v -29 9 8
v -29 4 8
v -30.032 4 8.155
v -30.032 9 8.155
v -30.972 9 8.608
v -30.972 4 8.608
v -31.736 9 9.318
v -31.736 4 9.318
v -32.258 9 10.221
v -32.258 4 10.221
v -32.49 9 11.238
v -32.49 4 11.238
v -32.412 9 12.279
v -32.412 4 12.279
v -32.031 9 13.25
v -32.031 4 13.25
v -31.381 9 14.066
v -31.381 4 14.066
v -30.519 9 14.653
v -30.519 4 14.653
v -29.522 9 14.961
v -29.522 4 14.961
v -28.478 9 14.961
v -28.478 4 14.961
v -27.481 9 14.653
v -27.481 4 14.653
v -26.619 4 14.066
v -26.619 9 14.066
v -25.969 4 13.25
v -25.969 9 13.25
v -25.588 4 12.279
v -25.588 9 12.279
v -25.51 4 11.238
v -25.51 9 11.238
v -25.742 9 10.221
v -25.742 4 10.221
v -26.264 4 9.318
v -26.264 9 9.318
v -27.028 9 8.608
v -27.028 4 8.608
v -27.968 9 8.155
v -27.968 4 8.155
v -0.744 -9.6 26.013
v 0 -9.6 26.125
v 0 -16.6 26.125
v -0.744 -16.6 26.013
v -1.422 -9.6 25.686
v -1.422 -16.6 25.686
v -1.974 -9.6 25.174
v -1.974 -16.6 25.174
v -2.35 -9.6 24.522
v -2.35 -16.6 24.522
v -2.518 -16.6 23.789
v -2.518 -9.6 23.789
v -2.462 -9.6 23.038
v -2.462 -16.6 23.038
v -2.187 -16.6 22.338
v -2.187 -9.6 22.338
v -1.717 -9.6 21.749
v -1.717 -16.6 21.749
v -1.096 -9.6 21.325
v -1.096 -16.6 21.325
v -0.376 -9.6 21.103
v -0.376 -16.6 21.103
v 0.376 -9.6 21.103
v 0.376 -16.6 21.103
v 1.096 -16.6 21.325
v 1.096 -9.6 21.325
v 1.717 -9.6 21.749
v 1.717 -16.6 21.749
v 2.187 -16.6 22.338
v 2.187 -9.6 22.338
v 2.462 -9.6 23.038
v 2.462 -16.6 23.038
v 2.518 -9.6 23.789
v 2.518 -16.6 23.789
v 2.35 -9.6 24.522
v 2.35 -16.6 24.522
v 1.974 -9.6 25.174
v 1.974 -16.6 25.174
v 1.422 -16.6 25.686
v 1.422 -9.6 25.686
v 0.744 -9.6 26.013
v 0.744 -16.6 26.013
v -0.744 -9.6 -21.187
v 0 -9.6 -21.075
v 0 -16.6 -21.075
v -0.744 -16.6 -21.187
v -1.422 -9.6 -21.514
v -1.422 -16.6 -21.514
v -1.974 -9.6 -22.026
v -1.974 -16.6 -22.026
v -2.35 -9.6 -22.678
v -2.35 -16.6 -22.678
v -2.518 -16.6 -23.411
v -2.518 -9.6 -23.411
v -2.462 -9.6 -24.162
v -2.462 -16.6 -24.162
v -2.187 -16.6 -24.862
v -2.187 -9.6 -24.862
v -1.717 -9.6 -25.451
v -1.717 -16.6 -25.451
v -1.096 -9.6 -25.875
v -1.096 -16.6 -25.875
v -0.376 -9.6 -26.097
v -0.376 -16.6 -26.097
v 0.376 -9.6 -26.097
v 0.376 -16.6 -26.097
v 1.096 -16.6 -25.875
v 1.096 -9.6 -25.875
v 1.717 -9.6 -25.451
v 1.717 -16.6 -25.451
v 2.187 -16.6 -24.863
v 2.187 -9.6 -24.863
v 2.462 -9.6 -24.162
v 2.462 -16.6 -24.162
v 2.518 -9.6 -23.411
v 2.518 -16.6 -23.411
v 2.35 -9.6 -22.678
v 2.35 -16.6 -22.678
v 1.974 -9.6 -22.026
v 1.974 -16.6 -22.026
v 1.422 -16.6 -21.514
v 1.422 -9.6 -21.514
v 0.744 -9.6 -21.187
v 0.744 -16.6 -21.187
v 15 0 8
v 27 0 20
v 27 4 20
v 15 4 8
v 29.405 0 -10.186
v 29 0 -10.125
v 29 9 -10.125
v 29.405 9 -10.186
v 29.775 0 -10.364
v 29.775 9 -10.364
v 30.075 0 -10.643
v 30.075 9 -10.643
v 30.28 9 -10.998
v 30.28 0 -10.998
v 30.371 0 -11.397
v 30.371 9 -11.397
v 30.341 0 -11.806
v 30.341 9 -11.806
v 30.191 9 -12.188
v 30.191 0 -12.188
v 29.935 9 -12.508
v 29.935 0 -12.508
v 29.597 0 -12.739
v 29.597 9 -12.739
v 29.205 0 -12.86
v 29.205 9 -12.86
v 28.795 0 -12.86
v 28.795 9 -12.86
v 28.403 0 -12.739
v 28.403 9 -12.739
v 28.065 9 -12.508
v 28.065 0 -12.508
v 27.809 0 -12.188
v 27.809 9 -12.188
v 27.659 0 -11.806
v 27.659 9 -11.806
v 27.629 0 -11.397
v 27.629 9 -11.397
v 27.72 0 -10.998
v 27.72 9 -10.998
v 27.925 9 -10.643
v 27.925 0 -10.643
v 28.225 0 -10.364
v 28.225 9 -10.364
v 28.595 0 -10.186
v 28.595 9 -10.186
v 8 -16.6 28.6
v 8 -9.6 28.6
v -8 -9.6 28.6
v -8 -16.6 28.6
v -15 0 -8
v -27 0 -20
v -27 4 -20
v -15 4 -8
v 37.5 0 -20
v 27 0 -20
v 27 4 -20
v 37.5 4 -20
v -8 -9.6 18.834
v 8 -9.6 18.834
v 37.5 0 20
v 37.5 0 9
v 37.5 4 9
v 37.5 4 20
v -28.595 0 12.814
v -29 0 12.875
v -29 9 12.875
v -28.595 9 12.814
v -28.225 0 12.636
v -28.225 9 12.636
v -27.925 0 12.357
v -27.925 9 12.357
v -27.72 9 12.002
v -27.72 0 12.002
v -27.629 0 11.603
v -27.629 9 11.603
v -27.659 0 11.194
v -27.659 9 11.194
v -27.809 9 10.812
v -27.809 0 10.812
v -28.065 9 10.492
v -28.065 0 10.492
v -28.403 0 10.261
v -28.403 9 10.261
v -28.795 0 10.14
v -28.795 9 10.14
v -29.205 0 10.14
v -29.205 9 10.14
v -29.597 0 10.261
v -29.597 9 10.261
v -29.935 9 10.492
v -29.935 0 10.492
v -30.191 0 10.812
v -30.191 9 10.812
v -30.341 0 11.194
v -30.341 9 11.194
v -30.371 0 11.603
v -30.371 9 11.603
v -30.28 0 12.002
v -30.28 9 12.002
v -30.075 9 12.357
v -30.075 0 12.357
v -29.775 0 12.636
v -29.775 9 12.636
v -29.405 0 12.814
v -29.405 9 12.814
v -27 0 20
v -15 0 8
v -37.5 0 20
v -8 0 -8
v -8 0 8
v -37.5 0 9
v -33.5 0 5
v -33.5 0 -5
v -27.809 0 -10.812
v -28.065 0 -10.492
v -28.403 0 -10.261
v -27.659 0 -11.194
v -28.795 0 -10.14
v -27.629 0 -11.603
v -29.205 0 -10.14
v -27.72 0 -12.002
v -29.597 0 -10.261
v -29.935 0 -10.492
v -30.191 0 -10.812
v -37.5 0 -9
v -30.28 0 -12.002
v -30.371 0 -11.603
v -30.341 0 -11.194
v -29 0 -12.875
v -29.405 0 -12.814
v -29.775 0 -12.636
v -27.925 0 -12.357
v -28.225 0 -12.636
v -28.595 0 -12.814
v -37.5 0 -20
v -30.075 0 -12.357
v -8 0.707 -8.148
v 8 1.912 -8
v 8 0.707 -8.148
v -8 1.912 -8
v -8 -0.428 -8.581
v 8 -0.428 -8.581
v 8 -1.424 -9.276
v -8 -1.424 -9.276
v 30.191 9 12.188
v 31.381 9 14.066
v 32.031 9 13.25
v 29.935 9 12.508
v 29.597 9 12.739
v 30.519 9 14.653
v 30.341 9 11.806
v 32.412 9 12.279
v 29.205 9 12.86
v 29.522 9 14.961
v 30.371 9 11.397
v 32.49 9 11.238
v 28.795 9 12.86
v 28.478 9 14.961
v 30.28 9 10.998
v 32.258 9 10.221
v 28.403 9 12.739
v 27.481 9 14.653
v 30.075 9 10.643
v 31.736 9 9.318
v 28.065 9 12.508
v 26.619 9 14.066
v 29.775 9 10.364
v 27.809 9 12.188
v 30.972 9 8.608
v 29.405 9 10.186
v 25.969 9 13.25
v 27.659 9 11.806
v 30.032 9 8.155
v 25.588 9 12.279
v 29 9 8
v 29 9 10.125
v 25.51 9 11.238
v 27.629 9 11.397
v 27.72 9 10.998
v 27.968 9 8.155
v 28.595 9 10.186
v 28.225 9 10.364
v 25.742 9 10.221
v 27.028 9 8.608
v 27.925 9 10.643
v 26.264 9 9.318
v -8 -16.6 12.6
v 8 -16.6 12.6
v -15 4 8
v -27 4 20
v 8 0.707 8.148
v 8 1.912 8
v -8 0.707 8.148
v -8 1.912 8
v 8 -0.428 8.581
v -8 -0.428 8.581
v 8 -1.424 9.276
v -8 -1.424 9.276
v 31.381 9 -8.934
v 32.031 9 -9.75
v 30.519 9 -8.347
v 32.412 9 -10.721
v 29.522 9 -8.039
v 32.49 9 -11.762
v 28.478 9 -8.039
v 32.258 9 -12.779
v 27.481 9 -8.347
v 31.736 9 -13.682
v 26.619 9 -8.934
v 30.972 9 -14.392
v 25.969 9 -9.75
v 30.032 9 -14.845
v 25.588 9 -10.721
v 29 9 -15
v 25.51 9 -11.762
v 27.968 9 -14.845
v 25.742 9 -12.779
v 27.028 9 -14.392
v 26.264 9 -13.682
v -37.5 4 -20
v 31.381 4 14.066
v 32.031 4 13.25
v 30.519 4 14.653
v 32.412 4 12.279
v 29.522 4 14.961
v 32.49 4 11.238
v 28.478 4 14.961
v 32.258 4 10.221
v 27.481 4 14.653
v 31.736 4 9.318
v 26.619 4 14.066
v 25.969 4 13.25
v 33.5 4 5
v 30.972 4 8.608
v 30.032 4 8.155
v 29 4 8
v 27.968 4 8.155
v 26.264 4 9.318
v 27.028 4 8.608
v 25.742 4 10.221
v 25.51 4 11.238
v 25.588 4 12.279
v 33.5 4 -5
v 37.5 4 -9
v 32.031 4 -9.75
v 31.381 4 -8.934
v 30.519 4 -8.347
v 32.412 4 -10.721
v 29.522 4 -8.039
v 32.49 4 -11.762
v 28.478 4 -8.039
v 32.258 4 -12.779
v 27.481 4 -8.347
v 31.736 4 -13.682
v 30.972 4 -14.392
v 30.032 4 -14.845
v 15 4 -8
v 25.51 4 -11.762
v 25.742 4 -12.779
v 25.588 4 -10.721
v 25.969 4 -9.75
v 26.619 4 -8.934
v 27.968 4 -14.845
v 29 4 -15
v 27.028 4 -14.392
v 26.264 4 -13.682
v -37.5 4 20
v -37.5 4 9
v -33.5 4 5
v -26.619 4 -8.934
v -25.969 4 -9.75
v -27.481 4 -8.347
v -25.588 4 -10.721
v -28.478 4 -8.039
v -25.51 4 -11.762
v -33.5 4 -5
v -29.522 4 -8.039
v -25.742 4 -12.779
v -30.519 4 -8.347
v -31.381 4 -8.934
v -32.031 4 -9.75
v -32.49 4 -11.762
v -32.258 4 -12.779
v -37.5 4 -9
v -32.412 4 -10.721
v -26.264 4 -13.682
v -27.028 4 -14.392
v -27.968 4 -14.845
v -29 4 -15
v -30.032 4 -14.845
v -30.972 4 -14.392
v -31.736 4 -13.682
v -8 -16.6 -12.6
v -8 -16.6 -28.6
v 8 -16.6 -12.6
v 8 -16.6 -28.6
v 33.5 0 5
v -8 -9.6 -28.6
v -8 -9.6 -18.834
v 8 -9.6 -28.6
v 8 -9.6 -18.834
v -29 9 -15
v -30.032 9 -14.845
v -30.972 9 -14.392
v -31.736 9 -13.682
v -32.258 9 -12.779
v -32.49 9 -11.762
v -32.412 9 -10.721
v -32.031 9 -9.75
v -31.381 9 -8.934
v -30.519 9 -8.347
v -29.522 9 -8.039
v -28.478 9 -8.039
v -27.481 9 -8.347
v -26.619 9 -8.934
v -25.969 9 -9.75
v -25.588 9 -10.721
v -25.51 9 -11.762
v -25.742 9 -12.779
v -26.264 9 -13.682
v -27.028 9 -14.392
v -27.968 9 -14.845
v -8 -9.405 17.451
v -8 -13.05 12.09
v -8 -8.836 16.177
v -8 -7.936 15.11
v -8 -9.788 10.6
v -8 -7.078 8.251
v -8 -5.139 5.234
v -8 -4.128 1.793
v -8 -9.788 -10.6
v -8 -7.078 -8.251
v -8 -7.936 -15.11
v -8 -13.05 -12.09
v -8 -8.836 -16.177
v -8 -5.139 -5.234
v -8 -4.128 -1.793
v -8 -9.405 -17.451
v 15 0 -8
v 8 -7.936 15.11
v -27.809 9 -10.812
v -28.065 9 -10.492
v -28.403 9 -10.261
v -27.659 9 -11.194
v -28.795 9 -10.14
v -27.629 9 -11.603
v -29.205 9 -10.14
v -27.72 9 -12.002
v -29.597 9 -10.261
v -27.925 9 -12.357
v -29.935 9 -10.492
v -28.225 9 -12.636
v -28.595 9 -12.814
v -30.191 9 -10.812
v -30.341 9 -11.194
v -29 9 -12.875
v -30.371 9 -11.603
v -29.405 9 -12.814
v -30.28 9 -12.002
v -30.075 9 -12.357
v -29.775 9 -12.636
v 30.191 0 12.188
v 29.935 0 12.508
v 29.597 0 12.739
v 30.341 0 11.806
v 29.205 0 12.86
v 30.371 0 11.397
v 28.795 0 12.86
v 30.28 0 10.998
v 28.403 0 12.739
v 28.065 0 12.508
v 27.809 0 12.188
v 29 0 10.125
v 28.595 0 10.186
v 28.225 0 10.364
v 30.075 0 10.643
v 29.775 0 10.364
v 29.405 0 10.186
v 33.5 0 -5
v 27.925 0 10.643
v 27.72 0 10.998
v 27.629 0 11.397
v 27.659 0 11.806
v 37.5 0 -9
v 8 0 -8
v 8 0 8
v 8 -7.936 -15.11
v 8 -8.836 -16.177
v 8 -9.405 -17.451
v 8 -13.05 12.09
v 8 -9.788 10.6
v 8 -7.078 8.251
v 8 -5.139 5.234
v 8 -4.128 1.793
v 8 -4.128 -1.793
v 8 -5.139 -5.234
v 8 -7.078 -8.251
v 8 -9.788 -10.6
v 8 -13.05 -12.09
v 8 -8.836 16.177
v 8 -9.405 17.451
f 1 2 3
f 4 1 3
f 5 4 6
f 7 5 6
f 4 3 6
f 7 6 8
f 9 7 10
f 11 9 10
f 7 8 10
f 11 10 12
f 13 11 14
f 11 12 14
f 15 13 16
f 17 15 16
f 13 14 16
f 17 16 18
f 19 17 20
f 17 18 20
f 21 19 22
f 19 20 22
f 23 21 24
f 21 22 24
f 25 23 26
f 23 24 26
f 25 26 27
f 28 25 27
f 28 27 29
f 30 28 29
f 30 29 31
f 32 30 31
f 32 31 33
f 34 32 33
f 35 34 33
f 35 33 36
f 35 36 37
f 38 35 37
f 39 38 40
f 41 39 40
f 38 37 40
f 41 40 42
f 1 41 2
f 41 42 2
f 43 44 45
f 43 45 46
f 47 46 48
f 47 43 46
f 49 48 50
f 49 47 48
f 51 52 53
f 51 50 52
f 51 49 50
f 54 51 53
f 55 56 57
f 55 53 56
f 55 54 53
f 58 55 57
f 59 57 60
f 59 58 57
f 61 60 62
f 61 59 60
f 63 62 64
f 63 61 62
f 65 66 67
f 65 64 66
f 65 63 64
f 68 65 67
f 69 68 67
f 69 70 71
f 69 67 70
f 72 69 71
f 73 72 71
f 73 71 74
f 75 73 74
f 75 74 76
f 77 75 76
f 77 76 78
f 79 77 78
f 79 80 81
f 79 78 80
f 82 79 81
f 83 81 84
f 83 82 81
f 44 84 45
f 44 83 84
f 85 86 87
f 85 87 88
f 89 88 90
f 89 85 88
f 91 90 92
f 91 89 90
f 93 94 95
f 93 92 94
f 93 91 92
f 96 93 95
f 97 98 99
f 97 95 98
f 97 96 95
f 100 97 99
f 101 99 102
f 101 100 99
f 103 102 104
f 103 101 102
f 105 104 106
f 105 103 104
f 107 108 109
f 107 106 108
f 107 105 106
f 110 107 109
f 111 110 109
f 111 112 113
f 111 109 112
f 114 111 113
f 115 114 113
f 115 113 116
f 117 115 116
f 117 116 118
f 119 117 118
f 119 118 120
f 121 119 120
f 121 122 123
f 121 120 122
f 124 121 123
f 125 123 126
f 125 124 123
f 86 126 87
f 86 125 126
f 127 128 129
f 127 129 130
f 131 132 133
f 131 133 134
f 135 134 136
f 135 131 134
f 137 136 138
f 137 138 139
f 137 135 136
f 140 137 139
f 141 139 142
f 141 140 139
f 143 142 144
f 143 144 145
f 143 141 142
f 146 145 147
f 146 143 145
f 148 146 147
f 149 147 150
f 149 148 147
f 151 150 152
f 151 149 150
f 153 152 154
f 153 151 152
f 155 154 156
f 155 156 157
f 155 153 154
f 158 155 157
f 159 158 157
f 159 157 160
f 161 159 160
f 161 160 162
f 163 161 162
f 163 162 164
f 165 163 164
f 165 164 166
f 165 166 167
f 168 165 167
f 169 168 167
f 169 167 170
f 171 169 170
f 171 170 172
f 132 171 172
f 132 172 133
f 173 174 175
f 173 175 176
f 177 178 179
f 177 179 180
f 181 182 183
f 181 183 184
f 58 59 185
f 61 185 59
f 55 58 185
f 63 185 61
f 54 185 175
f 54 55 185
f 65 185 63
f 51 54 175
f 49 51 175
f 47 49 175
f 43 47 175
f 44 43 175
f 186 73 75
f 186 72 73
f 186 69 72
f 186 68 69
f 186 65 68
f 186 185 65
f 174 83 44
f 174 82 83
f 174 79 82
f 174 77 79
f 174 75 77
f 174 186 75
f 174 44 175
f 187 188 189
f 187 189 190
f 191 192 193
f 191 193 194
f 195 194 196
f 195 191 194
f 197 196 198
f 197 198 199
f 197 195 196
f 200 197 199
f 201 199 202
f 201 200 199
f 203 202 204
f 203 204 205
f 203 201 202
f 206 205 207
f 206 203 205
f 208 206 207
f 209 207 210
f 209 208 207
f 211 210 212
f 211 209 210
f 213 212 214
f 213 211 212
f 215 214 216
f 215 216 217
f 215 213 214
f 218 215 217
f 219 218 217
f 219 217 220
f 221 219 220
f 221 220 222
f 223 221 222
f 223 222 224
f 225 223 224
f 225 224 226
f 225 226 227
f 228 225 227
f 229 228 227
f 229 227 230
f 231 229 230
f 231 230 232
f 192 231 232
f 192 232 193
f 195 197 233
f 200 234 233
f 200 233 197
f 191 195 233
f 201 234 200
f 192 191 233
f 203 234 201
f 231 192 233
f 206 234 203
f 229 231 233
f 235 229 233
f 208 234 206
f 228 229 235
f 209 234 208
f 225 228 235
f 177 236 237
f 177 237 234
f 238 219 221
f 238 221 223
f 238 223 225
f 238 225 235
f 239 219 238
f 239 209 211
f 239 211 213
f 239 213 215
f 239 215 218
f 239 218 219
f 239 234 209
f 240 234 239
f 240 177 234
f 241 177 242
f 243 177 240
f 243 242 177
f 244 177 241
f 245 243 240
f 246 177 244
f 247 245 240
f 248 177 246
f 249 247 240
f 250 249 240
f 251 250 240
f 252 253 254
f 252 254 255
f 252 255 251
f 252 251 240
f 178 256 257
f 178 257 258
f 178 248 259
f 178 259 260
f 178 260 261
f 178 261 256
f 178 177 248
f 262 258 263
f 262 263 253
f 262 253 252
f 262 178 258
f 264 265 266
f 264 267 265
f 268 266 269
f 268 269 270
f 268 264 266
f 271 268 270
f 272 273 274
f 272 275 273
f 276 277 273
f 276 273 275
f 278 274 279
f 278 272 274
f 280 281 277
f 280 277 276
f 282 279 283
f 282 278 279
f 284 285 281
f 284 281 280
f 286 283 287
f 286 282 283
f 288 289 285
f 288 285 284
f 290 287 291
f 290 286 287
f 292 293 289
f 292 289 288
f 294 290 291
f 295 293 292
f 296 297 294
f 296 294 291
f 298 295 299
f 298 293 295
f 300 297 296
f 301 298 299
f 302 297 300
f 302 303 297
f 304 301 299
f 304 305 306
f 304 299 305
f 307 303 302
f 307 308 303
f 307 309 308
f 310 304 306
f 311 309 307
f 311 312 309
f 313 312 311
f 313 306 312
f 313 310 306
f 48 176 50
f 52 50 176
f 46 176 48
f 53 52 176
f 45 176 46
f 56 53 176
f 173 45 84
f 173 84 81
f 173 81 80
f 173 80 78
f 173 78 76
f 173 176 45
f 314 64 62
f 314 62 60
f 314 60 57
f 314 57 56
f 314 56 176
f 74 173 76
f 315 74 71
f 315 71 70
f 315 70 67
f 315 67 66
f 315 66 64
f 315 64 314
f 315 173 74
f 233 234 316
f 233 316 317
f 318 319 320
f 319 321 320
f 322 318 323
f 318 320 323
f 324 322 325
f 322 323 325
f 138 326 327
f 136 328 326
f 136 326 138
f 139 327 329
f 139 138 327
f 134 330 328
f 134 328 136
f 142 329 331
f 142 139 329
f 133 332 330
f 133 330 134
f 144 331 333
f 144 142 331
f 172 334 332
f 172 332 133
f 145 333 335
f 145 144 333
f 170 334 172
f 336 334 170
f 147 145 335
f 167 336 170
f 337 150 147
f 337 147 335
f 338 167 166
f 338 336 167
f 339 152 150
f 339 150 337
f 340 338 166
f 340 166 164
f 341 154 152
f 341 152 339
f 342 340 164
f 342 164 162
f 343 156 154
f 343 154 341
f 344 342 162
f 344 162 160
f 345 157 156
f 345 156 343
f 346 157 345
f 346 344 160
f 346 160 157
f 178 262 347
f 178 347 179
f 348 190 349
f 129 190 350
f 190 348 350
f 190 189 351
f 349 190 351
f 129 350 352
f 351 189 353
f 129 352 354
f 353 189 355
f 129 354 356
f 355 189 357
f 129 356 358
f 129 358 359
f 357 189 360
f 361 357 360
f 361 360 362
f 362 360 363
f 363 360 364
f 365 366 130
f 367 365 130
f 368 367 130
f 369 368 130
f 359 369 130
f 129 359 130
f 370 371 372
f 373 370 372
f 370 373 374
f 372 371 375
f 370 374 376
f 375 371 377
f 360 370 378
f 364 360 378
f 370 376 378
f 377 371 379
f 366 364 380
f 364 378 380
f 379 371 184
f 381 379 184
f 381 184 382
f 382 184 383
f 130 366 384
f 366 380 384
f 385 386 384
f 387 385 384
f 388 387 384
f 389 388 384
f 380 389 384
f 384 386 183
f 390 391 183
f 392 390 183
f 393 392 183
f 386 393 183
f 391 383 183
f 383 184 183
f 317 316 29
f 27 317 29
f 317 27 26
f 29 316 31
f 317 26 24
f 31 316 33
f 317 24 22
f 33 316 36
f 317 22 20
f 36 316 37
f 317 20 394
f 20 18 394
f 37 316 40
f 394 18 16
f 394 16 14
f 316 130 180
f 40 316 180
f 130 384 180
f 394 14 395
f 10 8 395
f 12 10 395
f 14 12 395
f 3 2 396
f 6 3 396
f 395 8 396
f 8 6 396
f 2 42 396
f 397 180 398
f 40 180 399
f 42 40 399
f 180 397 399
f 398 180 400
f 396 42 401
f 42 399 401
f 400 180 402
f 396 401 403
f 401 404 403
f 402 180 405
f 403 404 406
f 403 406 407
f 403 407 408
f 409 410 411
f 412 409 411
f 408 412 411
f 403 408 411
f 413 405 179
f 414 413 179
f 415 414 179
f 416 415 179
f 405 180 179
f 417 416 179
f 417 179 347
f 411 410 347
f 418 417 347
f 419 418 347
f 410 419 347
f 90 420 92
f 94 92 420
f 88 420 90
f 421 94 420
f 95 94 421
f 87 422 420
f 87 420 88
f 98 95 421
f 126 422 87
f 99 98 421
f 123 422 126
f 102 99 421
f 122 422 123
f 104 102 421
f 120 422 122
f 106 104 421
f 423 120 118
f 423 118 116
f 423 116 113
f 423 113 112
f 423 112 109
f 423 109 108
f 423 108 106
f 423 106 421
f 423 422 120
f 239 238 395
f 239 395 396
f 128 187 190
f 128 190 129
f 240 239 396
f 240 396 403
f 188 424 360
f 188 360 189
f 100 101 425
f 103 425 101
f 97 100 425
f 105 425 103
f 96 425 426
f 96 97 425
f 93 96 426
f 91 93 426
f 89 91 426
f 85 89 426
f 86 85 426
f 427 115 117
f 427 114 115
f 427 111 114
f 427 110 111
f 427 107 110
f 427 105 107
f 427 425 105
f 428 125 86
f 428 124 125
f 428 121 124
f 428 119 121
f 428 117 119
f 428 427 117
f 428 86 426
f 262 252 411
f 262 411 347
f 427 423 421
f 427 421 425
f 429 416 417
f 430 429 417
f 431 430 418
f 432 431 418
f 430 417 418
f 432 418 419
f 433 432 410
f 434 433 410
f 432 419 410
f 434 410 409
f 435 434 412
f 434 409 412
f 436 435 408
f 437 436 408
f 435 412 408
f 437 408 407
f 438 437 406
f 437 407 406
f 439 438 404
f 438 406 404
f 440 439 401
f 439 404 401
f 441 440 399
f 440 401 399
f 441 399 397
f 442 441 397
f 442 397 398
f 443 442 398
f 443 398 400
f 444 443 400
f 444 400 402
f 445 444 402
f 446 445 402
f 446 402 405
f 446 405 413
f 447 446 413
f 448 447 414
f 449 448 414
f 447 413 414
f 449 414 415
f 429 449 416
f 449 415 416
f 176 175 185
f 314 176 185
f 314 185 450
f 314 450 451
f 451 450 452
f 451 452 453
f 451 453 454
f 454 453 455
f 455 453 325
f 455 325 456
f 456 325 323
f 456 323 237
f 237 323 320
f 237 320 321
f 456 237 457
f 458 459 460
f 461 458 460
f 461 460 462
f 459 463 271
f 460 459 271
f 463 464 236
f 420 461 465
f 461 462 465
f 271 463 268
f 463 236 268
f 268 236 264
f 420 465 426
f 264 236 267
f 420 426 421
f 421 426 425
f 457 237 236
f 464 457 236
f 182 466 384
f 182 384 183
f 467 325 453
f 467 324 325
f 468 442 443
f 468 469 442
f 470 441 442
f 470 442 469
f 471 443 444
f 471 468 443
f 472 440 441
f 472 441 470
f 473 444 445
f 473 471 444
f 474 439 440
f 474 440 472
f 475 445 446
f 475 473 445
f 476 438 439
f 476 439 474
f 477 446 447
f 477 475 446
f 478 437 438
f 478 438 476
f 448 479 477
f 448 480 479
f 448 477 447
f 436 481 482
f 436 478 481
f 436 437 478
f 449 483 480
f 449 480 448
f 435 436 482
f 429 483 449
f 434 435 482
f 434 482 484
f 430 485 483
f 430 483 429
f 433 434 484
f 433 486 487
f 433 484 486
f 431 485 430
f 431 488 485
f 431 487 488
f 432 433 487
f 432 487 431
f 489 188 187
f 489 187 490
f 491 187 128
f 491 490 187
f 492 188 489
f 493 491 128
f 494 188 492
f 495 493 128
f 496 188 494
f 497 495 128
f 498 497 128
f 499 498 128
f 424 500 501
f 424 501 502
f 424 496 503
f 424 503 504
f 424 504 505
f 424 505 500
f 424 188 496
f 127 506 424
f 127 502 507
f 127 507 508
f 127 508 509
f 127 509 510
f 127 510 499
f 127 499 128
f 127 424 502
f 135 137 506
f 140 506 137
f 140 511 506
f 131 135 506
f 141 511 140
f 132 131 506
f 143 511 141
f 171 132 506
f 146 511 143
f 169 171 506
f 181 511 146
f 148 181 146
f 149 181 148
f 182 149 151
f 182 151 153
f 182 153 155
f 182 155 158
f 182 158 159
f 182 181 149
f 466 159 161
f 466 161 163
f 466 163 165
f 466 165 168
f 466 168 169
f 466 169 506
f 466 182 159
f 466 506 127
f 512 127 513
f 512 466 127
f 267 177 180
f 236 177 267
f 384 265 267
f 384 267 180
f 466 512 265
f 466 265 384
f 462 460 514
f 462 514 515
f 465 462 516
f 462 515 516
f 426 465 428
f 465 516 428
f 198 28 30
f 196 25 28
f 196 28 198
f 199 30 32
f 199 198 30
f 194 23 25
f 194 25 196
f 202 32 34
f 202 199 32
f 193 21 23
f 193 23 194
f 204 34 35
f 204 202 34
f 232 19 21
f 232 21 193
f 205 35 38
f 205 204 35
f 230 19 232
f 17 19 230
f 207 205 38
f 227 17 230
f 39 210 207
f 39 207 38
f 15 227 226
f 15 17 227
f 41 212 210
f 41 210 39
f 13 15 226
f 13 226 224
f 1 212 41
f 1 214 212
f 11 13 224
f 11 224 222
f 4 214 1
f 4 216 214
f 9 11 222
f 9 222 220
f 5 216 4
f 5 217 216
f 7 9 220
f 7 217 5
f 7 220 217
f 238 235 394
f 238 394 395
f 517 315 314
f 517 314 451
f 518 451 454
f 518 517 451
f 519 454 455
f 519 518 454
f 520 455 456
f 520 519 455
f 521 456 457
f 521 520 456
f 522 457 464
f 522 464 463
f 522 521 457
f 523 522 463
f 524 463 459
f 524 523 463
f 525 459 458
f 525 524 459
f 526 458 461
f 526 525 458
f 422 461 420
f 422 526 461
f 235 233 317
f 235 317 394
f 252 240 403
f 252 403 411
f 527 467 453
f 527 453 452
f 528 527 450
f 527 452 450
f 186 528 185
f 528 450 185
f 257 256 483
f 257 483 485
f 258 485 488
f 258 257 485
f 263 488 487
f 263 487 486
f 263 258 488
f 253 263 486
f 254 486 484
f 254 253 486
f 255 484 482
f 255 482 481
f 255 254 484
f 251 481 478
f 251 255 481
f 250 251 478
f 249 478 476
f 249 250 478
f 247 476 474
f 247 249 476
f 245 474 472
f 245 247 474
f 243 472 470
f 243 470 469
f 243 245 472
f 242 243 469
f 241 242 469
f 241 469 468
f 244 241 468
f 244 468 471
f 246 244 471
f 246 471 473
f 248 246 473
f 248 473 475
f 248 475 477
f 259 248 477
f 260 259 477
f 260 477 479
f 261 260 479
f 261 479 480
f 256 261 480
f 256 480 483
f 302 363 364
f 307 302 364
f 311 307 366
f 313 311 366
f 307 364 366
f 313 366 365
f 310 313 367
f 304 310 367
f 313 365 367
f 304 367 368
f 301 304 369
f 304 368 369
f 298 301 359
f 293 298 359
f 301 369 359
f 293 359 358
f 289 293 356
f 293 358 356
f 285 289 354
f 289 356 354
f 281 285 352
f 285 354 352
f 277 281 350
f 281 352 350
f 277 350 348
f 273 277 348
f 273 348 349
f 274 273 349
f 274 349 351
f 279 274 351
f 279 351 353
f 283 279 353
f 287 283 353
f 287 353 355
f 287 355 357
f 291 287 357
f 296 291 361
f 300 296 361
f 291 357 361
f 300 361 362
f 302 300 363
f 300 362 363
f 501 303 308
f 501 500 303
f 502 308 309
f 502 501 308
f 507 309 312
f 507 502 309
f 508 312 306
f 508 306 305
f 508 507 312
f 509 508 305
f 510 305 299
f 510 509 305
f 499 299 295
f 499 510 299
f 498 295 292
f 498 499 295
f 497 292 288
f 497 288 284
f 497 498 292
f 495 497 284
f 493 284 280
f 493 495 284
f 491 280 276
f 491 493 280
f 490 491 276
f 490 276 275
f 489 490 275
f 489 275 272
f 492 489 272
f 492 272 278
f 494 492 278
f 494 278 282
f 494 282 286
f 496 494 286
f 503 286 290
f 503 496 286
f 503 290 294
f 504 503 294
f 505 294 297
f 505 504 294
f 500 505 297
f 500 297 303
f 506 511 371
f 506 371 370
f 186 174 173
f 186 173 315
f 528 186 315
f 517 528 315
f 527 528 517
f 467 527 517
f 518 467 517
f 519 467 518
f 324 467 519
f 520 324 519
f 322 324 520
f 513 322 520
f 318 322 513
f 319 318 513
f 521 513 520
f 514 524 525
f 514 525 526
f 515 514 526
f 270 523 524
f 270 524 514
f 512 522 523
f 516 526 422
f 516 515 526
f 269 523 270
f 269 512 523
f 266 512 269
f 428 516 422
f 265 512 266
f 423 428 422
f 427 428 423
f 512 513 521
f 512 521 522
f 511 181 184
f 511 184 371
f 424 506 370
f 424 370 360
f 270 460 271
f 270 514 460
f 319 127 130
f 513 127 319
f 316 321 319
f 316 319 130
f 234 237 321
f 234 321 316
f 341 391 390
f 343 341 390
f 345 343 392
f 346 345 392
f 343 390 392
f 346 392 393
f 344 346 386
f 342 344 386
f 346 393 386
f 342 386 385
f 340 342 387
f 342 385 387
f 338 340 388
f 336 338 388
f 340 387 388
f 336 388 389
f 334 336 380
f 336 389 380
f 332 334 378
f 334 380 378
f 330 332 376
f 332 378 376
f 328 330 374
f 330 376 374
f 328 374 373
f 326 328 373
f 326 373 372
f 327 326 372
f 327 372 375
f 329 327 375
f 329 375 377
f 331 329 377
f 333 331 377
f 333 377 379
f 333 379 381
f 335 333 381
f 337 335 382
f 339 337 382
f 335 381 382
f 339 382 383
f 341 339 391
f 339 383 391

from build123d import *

# Parameters (mm, degrees)
SKETCH1_R                  = 1.375
MOUNT_PLATE_DEPTH          = 4
FEUSELAGE_MOUNT_DEPTH      = 8
SKETCH8_R                  = 3.5
SKETCH8_R_2                = 1.375
MOUNTING_HOLES_DEPTH       = 5
FASTENING_HOLES_DEPTH      = 54.661625022
FASTENING_HOLES_DEPTH_BACK = 8
SKETCH10_R                 = 2.525
FILLET1_R                  = 5


with BuildPart() as part:
    # Sketch1 → Mount_Plate (new body)
    with BuildSketch(Plane(origin=(0, 0, 0), x_dir=(1, 0, 0), z_dir=(0, 1, 0))):
        Polygon((37.5, 20), (37.5, 9), (33.5, 5), (33.5, -5), (37.5, -9), (37.5, -20), (27, -20), (15, -8), (-15, -8), (-27, -20), (-37.5, -20), (-37.5, -9), (-33.5, -5), (-33.5, 5), (-37.5, 9), (-37.5, 20), (-27, 20), (-15, 8), (15, 8), (27, 20), align=None)
        with Locations(Location((-29, -11.5, 0), (0, 0, 270))):
            Circle(SKETCH1_R, mode=Mode.SUBTRACT)
        with Locations(Location((-29, 11.5, 0), (0, 0, 90))):
            Circle(SKETCH1_R, mode=Mode.SUBTRACT)
        with Locations(Location((29, -11.5, 0), (0, 0, 90))):
            Circle(SKETCH1_R, mode=Mode.SUBTRACT)
        with Locations(Location((29, 11.5, 0), (0, 0, 270))):
            Circle(SKETCH1_R, mode=Mode.SUBTRACT)
    extrude(amount=MOUNT_PLATE_DEPTH)

    # Sketch4 → Feuselage_Mount (add, symmetric)
    with BuildSketch(Plane(origin=(0, 0, 0), x_dir=(0, 0, -1), z_dir=(1, 0, 0))):
        with BuildLine():
            Line((-16.6, -9.6), (-28.6, -9.6))
            Line((-28.6, -9.6), (-28.6, -16.6))
            Line((-28.6, -16.6), (-12.6, -16.6))
            ThreePointArc((-12.6, -16.6), (0, -4), (12.6, -16.6))
            Line((12.6, -16.6), (28.6, -16.6))
            Line((28.6, -16.6), (28.6, -9.6))
            Line((28.6, -9.6), (16.6, -9.6))
            Line((16.6, -9.6), (8, 0))
            Line((8, 0), (-8, 0))
            Line((-8, 0), (-16.6, -9.6))
        make_face()
    extrude(amount=FEUSELAGE_MOUNT_DEPTH, both=True)

    # Sketch8 → Mounting_Holes (add)
    # profile 1 of 4: a face of its own
    with BuildSketch(Plane(origin=(0, 4, 0), x_dir=(1, 0, 0), z_dir=(0, 1, 0))):
        with Locations(Location((29, -11.5, 0), (0, 0, 90))):
            Circle(SKETCH8_R)
        with Locations(Location((29, -11.5, 0), (0, 0, 90))):
            Circle(SKETCH8_R_2, mode=Mode.SUBTRACT)
    # profile 2 of 4: a face of its own
    with BuildSketch(Plane(origin=(0, 4, 0), x_dir=(1, 0, 0), z_dir=(0, 1, 0))):
        with Locations(Location((-29, 11.5, 0), (0, 0, 90))):
            Circle(SKETCH8_R)
        with Locations(Location((-29, 11.5, 0), (0, 0, 90))):
            Circle(SKETCH8_R_2, mode=Mode.SUBTRACT)
    # profile 3 of 4: a face of its own
    with BuildSketch(Plane(origin=(0, 4, 0), x_dir=(1, 0, 0), z_dir=(0, 1, 0))):
        with Locations(Location((-29, -11.5, 0), (0, 0, 90))):
            Circle(SKETCH8_R)
        with Locations(Location((-29, -11.5, 0), (0, 0, 270))):
            Circle(SKETCH8_R_2, mode=Mode.SUBTRACT)
    # profile 4 of 4: a face of its own
    with BuildSketch(Plane(origin=(0, 4, 0), x_dir=(1, 0, 0), z_dir=(0, 1, 0))):
        with Locations(Location((29, 11.5, 0), (0, 0, 90))):
            Circle(SKETCH8_R)
        with Locations(Location((29, 11.5, 0), (0, 0, 270))):
            Circle(SKETCH8_R_2, mode=Mode.SUBTRACT)
    extrude(amount=MOUNTING_HOLES_DEPTH)

    # Sketch10 → Fastening_Holes (cut, two sides: drawn at the far end of the back side and taken through both)
    with BuildSketch(Plane.XZ.offset(16.6).offset(-FASTENING_HOLES_DEPTH_BACK)):
        with Locations(Location((0, 23.6, 0), (0, 0, 90))):
            Circle(SKETCH10_R)
        with Locations(Location((0, -23.6, 0), (0, 0, 90))):
            Circle(SKETCH10_R)
    extrude(amount=FASTENING_HOLES_DEPTH + FASTENING_HOLES_DEPTH_BACK, mode=Mode.SUBTRACT)

    # Fillet1
    fillet1_edges = [part.edges().sort_by_distance(p)[0] for p in [
        (0, 0, 8),
        (0, -9.6, 16.6),
        (0, -9.6, -16.6),
        (0, 0, -8),
    ]]
    fillet(fillet1_edges, radius=FILLET1_R)


solid = part.part
